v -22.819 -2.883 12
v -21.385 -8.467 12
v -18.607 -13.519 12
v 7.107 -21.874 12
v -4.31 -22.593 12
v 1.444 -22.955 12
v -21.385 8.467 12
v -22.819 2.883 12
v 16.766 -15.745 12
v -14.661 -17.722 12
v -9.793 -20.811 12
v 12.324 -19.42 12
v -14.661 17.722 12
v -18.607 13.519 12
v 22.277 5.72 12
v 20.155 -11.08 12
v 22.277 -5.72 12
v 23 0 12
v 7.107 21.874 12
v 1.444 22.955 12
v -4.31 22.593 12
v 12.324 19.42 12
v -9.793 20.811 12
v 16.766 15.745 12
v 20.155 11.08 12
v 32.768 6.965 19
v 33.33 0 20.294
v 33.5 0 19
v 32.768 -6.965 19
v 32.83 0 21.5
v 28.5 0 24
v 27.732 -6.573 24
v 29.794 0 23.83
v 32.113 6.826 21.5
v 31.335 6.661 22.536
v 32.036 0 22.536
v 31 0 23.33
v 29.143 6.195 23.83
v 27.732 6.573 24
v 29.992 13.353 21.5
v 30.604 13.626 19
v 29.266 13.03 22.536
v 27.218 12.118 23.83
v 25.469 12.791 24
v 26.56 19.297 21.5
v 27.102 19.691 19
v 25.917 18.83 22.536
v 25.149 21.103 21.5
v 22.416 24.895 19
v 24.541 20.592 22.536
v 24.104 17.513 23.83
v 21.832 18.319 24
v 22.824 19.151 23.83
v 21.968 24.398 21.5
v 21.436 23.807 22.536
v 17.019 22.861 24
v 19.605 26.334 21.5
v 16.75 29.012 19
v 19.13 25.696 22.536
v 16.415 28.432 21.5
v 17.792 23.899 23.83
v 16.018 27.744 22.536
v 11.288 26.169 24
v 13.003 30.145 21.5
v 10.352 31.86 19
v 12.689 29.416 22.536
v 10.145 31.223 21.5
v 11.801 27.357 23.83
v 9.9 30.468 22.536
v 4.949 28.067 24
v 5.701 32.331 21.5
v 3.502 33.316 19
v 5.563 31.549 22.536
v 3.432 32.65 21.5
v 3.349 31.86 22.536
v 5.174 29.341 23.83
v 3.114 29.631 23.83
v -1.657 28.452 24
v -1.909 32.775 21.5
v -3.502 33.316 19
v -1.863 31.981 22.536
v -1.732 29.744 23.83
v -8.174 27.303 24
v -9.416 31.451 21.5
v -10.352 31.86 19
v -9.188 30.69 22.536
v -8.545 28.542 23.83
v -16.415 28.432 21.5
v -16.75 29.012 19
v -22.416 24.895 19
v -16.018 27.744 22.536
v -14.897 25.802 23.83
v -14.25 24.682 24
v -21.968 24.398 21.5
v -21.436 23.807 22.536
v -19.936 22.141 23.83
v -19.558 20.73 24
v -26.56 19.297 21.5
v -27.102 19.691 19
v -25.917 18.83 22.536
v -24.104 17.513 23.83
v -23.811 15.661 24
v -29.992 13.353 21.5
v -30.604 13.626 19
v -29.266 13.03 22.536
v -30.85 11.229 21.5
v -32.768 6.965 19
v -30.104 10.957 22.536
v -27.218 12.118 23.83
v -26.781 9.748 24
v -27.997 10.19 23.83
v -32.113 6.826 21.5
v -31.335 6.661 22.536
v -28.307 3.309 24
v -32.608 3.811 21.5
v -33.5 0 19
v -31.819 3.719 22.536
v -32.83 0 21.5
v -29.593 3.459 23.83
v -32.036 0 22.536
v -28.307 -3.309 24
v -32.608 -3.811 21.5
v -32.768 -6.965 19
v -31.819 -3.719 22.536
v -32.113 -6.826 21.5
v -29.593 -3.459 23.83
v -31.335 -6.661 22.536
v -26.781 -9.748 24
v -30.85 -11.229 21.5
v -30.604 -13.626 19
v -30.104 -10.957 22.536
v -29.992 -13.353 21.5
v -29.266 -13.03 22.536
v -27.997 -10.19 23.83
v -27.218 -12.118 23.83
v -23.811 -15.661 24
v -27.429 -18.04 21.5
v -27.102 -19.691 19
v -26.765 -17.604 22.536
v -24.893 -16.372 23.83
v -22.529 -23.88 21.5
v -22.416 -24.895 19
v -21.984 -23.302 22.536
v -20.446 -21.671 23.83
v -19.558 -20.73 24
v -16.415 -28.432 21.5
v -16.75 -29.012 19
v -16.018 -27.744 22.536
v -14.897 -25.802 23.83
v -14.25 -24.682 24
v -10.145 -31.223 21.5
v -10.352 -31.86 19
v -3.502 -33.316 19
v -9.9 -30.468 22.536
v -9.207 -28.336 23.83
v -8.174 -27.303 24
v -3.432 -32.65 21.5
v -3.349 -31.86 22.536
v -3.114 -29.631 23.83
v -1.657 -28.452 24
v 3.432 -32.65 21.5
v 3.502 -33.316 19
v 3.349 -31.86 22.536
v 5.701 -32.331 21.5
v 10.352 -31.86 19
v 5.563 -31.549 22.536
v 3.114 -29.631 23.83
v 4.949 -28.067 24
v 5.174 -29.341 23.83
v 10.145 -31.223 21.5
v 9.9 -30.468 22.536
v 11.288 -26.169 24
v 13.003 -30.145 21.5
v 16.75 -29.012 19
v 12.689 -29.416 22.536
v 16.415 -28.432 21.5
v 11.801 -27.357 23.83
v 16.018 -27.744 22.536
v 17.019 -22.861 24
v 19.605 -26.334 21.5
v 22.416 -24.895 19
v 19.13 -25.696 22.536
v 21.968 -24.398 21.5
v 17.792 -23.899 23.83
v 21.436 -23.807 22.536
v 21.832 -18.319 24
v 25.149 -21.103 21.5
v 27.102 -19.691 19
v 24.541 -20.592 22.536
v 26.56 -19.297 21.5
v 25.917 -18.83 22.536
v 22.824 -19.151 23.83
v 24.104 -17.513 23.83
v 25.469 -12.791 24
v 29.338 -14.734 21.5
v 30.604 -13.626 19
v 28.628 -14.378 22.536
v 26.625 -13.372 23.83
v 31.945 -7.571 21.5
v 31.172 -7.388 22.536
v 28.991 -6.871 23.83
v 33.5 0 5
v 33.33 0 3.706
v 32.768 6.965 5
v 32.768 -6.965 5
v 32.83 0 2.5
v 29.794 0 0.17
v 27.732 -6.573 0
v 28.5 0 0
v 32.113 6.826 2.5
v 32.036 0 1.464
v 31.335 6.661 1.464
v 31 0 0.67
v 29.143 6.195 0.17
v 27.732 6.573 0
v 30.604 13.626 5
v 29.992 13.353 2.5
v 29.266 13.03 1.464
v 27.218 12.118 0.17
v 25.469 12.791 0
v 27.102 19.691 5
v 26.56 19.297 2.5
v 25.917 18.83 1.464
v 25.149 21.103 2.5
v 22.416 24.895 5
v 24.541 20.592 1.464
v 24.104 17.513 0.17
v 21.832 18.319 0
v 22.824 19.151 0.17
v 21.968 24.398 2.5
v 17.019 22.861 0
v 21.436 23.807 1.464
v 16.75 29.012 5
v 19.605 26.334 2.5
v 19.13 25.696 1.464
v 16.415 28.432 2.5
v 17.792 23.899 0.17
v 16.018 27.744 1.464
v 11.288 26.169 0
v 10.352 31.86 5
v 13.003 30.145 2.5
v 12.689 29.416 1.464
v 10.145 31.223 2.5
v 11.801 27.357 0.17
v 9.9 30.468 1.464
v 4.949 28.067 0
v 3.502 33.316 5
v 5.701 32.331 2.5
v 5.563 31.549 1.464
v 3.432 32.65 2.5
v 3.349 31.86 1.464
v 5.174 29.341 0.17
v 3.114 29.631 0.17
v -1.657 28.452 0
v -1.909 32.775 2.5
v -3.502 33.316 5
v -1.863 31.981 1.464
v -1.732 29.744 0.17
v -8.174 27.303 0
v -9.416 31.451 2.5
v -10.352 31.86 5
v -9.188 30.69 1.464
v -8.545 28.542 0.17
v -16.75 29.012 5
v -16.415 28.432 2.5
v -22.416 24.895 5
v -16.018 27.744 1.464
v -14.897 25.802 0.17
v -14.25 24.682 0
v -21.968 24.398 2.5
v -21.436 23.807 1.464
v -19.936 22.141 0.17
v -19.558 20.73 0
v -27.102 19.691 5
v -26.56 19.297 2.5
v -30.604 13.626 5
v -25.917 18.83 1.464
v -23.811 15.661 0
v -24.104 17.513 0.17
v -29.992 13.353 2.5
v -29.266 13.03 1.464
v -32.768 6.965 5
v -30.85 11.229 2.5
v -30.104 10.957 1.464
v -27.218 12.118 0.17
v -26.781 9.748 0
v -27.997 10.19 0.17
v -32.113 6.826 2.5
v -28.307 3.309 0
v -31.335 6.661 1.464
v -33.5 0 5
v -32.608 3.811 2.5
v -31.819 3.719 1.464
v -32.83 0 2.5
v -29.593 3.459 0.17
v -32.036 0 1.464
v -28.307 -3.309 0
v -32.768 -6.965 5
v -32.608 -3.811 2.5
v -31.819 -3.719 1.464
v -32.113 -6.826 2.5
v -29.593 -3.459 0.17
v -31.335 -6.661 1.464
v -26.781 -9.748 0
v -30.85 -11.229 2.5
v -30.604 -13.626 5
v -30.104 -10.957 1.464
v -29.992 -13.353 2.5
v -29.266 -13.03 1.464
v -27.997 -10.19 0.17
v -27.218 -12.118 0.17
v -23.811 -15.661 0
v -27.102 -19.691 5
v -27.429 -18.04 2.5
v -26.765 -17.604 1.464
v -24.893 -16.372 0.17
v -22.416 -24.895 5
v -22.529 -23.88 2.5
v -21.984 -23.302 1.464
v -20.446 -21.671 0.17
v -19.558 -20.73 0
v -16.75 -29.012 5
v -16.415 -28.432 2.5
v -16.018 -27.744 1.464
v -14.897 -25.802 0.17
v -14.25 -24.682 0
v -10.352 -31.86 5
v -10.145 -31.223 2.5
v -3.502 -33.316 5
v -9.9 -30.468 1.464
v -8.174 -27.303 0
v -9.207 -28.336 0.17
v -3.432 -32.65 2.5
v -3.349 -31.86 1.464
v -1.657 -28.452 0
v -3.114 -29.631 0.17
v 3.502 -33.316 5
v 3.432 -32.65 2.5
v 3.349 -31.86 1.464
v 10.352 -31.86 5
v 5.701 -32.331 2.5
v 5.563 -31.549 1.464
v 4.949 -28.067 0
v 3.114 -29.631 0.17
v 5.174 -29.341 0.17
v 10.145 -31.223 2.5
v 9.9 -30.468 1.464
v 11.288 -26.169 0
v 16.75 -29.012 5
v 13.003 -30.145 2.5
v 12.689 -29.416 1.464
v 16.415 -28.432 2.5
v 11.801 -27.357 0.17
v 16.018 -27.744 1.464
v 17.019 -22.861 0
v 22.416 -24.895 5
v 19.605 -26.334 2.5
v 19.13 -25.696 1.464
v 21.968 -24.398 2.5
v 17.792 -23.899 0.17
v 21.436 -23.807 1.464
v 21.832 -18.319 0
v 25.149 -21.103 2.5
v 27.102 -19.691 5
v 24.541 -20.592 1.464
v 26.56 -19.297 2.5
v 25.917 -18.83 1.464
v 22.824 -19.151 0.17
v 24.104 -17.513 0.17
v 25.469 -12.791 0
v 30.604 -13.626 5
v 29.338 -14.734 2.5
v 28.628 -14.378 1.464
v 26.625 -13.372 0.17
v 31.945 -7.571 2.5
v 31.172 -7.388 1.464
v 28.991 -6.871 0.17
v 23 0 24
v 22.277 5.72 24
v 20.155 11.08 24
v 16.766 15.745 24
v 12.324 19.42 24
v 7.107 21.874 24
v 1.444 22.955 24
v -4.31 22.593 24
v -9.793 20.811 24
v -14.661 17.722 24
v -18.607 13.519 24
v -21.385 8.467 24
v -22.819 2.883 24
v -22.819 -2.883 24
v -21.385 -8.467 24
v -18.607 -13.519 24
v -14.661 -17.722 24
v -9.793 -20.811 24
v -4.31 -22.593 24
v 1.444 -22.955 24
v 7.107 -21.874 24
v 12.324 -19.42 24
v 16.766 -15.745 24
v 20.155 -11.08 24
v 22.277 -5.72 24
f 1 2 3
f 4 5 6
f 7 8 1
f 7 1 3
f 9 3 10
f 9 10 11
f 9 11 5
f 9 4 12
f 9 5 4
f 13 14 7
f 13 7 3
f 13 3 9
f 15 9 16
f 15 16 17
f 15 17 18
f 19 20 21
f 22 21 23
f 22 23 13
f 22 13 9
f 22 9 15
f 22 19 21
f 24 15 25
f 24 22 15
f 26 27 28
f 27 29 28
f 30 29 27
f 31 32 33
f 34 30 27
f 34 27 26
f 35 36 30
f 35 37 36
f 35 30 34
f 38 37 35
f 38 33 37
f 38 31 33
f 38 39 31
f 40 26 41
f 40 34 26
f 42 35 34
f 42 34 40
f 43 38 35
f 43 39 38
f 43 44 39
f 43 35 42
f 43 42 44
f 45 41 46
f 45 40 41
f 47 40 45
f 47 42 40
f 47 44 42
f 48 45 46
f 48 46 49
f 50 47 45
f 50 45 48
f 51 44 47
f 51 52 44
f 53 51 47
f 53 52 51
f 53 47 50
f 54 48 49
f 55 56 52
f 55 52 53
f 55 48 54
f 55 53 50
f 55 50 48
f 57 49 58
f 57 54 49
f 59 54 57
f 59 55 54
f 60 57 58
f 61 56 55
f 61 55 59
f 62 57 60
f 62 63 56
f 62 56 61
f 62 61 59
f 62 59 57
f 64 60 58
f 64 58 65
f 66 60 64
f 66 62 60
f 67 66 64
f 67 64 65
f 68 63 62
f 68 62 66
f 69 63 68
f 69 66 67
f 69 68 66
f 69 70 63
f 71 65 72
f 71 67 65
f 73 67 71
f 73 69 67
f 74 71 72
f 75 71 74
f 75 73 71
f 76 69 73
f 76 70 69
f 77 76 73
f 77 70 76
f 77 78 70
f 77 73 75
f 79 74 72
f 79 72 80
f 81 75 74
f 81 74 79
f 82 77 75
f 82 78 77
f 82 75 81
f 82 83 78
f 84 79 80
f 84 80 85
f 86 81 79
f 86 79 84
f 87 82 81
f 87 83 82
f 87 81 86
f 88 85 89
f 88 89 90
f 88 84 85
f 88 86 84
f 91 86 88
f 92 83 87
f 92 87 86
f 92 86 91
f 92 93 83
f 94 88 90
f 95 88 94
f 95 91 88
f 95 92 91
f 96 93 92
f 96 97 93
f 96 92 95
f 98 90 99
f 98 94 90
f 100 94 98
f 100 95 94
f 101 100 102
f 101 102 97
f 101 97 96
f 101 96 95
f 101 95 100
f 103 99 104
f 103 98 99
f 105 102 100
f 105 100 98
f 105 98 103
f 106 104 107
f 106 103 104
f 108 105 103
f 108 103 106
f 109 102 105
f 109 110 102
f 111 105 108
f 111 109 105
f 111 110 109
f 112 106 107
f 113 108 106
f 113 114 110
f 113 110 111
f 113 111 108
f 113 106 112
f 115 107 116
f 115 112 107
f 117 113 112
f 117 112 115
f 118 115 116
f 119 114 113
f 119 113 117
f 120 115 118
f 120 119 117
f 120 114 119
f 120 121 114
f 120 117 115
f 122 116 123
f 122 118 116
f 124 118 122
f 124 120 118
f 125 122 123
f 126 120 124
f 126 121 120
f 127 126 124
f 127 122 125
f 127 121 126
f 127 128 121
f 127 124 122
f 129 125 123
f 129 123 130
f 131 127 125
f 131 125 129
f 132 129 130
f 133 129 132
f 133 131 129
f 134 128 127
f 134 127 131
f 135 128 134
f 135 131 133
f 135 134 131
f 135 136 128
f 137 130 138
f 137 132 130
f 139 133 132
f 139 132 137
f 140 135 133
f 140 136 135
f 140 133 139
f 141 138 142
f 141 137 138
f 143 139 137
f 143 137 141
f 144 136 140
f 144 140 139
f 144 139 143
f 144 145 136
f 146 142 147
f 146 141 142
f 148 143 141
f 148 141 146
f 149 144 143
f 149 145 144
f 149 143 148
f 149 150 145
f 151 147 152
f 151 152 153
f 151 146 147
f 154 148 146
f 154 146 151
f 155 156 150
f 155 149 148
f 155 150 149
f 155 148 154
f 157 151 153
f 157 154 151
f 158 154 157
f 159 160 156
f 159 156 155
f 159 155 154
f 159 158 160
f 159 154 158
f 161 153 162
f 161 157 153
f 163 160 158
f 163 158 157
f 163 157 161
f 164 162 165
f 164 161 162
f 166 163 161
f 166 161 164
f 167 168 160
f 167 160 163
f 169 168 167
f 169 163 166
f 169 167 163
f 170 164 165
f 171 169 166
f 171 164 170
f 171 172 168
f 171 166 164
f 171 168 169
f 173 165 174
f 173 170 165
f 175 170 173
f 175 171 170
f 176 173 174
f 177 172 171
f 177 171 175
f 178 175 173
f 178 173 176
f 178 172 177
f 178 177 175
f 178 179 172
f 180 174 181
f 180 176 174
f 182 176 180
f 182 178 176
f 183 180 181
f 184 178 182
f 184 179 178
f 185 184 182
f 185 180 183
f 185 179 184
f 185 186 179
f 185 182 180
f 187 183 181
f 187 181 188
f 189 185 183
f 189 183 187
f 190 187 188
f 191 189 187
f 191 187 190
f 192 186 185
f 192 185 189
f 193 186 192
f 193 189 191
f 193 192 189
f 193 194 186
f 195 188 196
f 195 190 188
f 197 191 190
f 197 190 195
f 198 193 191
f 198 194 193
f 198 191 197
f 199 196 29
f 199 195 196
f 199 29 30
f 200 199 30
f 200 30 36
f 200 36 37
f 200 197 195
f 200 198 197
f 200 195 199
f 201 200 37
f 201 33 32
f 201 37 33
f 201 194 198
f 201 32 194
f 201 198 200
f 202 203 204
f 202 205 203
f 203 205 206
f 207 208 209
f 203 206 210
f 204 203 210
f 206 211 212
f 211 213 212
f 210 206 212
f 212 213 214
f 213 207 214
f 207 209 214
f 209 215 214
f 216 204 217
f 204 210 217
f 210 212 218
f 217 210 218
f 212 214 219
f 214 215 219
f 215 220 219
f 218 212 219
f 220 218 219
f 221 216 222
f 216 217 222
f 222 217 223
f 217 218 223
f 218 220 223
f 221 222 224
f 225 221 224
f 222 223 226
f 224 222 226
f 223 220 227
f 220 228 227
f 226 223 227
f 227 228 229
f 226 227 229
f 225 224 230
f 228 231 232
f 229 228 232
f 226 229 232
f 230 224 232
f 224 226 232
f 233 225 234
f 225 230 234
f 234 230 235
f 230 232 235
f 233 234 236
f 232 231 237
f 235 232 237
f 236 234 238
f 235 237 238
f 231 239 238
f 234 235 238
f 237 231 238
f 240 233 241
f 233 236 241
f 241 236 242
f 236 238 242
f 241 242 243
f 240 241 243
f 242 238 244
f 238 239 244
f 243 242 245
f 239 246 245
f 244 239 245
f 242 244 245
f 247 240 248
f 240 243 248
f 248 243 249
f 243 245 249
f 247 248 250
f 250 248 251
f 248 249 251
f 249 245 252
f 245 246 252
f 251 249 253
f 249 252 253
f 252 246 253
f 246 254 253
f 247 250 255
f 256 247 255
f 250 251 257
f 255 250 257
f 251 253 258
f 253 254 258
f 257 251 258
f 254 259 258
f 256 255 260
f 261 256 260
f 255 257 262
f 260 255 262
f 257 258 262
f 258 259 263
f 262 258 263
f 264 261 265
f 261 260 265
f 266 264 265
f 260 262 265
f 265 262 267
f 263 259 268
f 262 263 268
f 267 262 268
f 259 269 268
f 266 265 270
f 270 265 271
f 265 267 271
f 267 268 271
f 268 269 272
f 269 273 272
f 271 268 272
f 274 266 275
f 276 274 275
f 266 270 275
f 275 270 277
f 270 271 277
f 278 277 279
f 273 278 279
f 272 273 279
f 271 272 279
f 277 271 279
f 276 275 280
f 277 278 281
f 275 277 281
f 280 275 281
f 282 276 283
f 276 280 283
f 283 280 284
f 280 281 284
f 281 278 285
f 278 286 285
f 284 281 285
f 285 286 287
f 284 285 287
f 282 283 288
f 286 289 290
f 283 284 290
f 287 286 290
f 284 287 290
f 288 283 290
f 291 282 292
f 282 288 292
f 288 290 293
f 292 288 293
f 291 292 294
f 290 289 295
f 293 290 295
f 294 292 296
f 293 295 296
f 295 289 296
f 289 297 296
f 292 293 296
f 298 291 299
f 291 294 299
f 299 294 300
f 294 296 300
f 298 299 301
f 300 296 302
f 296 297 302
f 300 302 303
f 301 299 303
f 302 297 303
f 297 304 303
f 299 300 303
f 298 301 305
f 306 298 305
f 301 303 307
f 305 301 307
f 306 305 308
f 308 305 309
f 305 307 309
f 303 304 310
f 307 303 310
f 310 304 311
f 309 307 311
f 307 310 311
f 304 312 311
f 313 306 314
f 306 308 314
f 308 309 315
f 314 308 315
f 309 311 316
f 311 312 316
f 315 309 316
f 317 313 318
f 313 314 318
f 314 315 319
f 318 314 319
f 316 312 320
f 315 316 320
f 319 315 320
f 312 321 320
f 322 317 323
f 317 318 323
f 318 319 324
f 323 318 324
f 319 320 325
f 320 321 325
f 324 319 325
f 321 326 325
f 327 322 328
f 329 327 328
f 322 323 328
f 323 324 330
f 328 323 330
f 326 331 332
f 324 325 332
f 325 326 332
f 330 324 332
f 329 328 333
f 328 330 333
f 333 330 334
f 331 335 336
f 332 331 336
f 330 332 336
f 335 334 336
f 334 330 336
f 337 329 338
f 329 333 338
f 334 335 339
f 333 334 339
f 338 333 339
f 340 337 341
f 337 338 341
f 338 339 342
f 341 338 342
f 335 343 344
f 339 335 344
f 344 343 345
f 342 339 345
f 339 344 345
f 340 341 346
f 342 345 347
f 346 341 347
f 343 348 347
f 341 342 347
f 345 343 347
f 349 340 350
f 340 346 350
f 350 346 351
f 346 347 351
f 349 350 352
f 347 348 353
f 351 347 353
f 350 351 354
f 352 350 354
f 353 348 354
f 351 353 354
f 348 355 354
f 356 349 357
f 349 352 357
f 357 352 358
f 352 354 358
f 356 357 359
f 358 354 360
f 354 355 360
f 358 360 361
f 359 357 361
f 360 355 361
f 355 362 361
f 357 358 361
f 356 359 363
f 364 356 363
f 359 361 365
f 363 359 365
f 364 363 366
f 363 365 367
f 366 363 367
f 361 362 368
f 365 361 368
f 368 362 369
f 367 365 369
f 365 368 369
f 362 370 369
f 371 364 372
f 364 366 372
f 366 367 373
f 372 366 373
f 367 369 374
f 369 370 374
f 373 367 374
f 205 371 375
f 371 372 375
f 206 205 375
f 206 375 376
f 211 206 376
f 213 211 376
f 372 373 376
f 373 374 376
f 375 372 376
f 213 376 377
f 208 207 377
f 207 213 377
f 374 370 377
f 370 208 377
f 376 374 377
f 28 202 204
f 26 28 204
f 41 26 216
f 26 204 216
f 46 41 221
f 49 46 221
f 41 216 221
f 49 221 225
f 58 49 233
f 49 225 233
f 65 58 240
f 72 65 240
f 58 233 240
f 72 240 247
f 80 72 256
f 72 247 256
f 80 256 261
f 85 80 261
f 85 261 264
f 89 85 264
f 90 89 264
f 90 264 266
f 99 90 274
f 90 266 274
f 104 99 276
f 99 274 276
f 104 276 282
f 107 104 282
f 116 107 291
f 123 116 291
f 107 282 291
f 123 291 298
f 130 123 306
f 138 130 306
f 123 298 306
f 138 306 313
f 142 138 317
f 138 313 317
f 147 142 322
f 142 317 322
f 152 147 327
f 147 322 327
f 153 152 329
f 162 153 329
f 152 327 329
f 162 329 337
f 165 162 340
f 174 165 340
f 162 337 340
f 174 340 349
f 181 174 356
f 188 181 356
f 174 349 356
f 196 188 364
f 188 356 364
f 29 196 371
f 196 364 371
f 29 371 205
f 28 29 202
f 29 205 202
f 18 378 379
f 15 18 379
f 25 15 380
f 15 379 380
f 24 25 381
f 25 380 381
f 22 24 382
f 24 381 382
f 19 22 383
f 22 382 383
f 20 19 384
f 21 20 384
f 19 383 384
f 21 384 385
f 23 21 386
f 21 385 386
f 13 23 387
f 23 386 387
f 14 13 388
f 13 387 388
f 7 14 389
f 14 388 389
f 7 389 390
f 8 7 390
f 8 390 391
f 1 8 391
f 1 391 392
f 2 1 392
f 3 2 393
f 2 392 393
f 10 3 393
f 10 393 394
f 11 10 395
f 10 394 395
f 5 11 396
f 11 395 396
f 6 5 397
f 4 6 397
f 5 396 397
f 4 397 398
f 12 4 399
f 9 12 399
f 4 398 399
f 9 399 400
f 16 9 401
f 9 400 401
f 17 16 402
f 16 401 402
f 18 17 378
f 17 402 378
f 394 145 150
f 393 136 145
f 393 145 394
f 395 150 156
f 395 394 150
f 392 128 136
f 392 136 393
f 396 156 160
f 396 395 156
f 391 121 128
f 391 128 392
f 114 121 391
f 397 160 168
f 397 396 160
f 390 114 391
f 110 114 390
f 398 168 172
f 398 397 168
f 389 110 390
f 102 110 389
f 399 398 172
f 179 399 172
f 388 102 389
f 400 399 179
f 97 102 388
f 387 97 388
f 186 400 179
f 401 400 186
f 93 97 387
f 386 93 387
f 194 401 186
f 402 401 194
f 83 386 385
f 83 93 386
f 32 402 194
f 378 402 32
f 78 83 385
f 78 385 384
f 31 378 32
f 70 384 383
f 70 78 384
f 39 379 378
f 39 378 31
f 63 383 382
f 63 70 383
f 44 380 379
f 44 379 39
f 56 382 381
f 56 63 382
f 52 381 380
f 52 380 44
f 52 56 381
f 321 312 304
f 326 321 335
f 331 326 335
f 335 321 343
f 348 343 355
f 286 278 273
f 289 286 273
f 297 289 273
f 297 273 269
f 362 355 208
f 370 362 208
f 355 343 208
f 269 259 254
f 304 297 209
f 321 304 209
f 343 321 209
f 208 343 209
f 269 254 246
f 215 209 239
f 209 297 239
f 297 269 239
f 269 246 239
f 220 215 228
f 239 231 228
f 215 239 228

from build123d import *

# Parameters (mm, degrees)
ESQUISSE1_R             = 33.5
BOSS_EXTRU_1_DEPTH      = 24
CONG_1_R                = 5
CONG_2_R                = 5
ESQUISSE2_R             = 23
ENL_V_MAT_EXTRU_1_DEPTH = 12


with BuildPart() as part:
    # Esquisse1 → Boss.-Extru.1 (new body)
    with BuildSketch(Plane.XY):
        Circle(ESQUISSE1_R)
    extrude(amount=BOSS_EXTRU_1_DEPTH)

    # Congé1
    cong_1_edges = [part.edges().sort_by_distance(p)[0] for p in [
        (-33.5, 0, 24),
    ]]
    fillet(cong_1_edges, radius=CONG_1_R)

    # Congé2
    cong_2_edges = [part.edges().sort_by_distance(p)[0] for p in [
        (-33.5, 0, 0),
    ]]
    fillet(cong_2_edges, radius=CONG_2_R)

    # Esquisse2 → Enlèv. mat.-Extru.1 (cut)
    with BuildSketch(Plane.XY.offset(24)):
        Circle(ESQUISSE2_R)
    extrude(amount=-ENL_V_MAT_EXTRU_1_DEPTH, mode=Mode.SUBTRACT)


solid = part.part
